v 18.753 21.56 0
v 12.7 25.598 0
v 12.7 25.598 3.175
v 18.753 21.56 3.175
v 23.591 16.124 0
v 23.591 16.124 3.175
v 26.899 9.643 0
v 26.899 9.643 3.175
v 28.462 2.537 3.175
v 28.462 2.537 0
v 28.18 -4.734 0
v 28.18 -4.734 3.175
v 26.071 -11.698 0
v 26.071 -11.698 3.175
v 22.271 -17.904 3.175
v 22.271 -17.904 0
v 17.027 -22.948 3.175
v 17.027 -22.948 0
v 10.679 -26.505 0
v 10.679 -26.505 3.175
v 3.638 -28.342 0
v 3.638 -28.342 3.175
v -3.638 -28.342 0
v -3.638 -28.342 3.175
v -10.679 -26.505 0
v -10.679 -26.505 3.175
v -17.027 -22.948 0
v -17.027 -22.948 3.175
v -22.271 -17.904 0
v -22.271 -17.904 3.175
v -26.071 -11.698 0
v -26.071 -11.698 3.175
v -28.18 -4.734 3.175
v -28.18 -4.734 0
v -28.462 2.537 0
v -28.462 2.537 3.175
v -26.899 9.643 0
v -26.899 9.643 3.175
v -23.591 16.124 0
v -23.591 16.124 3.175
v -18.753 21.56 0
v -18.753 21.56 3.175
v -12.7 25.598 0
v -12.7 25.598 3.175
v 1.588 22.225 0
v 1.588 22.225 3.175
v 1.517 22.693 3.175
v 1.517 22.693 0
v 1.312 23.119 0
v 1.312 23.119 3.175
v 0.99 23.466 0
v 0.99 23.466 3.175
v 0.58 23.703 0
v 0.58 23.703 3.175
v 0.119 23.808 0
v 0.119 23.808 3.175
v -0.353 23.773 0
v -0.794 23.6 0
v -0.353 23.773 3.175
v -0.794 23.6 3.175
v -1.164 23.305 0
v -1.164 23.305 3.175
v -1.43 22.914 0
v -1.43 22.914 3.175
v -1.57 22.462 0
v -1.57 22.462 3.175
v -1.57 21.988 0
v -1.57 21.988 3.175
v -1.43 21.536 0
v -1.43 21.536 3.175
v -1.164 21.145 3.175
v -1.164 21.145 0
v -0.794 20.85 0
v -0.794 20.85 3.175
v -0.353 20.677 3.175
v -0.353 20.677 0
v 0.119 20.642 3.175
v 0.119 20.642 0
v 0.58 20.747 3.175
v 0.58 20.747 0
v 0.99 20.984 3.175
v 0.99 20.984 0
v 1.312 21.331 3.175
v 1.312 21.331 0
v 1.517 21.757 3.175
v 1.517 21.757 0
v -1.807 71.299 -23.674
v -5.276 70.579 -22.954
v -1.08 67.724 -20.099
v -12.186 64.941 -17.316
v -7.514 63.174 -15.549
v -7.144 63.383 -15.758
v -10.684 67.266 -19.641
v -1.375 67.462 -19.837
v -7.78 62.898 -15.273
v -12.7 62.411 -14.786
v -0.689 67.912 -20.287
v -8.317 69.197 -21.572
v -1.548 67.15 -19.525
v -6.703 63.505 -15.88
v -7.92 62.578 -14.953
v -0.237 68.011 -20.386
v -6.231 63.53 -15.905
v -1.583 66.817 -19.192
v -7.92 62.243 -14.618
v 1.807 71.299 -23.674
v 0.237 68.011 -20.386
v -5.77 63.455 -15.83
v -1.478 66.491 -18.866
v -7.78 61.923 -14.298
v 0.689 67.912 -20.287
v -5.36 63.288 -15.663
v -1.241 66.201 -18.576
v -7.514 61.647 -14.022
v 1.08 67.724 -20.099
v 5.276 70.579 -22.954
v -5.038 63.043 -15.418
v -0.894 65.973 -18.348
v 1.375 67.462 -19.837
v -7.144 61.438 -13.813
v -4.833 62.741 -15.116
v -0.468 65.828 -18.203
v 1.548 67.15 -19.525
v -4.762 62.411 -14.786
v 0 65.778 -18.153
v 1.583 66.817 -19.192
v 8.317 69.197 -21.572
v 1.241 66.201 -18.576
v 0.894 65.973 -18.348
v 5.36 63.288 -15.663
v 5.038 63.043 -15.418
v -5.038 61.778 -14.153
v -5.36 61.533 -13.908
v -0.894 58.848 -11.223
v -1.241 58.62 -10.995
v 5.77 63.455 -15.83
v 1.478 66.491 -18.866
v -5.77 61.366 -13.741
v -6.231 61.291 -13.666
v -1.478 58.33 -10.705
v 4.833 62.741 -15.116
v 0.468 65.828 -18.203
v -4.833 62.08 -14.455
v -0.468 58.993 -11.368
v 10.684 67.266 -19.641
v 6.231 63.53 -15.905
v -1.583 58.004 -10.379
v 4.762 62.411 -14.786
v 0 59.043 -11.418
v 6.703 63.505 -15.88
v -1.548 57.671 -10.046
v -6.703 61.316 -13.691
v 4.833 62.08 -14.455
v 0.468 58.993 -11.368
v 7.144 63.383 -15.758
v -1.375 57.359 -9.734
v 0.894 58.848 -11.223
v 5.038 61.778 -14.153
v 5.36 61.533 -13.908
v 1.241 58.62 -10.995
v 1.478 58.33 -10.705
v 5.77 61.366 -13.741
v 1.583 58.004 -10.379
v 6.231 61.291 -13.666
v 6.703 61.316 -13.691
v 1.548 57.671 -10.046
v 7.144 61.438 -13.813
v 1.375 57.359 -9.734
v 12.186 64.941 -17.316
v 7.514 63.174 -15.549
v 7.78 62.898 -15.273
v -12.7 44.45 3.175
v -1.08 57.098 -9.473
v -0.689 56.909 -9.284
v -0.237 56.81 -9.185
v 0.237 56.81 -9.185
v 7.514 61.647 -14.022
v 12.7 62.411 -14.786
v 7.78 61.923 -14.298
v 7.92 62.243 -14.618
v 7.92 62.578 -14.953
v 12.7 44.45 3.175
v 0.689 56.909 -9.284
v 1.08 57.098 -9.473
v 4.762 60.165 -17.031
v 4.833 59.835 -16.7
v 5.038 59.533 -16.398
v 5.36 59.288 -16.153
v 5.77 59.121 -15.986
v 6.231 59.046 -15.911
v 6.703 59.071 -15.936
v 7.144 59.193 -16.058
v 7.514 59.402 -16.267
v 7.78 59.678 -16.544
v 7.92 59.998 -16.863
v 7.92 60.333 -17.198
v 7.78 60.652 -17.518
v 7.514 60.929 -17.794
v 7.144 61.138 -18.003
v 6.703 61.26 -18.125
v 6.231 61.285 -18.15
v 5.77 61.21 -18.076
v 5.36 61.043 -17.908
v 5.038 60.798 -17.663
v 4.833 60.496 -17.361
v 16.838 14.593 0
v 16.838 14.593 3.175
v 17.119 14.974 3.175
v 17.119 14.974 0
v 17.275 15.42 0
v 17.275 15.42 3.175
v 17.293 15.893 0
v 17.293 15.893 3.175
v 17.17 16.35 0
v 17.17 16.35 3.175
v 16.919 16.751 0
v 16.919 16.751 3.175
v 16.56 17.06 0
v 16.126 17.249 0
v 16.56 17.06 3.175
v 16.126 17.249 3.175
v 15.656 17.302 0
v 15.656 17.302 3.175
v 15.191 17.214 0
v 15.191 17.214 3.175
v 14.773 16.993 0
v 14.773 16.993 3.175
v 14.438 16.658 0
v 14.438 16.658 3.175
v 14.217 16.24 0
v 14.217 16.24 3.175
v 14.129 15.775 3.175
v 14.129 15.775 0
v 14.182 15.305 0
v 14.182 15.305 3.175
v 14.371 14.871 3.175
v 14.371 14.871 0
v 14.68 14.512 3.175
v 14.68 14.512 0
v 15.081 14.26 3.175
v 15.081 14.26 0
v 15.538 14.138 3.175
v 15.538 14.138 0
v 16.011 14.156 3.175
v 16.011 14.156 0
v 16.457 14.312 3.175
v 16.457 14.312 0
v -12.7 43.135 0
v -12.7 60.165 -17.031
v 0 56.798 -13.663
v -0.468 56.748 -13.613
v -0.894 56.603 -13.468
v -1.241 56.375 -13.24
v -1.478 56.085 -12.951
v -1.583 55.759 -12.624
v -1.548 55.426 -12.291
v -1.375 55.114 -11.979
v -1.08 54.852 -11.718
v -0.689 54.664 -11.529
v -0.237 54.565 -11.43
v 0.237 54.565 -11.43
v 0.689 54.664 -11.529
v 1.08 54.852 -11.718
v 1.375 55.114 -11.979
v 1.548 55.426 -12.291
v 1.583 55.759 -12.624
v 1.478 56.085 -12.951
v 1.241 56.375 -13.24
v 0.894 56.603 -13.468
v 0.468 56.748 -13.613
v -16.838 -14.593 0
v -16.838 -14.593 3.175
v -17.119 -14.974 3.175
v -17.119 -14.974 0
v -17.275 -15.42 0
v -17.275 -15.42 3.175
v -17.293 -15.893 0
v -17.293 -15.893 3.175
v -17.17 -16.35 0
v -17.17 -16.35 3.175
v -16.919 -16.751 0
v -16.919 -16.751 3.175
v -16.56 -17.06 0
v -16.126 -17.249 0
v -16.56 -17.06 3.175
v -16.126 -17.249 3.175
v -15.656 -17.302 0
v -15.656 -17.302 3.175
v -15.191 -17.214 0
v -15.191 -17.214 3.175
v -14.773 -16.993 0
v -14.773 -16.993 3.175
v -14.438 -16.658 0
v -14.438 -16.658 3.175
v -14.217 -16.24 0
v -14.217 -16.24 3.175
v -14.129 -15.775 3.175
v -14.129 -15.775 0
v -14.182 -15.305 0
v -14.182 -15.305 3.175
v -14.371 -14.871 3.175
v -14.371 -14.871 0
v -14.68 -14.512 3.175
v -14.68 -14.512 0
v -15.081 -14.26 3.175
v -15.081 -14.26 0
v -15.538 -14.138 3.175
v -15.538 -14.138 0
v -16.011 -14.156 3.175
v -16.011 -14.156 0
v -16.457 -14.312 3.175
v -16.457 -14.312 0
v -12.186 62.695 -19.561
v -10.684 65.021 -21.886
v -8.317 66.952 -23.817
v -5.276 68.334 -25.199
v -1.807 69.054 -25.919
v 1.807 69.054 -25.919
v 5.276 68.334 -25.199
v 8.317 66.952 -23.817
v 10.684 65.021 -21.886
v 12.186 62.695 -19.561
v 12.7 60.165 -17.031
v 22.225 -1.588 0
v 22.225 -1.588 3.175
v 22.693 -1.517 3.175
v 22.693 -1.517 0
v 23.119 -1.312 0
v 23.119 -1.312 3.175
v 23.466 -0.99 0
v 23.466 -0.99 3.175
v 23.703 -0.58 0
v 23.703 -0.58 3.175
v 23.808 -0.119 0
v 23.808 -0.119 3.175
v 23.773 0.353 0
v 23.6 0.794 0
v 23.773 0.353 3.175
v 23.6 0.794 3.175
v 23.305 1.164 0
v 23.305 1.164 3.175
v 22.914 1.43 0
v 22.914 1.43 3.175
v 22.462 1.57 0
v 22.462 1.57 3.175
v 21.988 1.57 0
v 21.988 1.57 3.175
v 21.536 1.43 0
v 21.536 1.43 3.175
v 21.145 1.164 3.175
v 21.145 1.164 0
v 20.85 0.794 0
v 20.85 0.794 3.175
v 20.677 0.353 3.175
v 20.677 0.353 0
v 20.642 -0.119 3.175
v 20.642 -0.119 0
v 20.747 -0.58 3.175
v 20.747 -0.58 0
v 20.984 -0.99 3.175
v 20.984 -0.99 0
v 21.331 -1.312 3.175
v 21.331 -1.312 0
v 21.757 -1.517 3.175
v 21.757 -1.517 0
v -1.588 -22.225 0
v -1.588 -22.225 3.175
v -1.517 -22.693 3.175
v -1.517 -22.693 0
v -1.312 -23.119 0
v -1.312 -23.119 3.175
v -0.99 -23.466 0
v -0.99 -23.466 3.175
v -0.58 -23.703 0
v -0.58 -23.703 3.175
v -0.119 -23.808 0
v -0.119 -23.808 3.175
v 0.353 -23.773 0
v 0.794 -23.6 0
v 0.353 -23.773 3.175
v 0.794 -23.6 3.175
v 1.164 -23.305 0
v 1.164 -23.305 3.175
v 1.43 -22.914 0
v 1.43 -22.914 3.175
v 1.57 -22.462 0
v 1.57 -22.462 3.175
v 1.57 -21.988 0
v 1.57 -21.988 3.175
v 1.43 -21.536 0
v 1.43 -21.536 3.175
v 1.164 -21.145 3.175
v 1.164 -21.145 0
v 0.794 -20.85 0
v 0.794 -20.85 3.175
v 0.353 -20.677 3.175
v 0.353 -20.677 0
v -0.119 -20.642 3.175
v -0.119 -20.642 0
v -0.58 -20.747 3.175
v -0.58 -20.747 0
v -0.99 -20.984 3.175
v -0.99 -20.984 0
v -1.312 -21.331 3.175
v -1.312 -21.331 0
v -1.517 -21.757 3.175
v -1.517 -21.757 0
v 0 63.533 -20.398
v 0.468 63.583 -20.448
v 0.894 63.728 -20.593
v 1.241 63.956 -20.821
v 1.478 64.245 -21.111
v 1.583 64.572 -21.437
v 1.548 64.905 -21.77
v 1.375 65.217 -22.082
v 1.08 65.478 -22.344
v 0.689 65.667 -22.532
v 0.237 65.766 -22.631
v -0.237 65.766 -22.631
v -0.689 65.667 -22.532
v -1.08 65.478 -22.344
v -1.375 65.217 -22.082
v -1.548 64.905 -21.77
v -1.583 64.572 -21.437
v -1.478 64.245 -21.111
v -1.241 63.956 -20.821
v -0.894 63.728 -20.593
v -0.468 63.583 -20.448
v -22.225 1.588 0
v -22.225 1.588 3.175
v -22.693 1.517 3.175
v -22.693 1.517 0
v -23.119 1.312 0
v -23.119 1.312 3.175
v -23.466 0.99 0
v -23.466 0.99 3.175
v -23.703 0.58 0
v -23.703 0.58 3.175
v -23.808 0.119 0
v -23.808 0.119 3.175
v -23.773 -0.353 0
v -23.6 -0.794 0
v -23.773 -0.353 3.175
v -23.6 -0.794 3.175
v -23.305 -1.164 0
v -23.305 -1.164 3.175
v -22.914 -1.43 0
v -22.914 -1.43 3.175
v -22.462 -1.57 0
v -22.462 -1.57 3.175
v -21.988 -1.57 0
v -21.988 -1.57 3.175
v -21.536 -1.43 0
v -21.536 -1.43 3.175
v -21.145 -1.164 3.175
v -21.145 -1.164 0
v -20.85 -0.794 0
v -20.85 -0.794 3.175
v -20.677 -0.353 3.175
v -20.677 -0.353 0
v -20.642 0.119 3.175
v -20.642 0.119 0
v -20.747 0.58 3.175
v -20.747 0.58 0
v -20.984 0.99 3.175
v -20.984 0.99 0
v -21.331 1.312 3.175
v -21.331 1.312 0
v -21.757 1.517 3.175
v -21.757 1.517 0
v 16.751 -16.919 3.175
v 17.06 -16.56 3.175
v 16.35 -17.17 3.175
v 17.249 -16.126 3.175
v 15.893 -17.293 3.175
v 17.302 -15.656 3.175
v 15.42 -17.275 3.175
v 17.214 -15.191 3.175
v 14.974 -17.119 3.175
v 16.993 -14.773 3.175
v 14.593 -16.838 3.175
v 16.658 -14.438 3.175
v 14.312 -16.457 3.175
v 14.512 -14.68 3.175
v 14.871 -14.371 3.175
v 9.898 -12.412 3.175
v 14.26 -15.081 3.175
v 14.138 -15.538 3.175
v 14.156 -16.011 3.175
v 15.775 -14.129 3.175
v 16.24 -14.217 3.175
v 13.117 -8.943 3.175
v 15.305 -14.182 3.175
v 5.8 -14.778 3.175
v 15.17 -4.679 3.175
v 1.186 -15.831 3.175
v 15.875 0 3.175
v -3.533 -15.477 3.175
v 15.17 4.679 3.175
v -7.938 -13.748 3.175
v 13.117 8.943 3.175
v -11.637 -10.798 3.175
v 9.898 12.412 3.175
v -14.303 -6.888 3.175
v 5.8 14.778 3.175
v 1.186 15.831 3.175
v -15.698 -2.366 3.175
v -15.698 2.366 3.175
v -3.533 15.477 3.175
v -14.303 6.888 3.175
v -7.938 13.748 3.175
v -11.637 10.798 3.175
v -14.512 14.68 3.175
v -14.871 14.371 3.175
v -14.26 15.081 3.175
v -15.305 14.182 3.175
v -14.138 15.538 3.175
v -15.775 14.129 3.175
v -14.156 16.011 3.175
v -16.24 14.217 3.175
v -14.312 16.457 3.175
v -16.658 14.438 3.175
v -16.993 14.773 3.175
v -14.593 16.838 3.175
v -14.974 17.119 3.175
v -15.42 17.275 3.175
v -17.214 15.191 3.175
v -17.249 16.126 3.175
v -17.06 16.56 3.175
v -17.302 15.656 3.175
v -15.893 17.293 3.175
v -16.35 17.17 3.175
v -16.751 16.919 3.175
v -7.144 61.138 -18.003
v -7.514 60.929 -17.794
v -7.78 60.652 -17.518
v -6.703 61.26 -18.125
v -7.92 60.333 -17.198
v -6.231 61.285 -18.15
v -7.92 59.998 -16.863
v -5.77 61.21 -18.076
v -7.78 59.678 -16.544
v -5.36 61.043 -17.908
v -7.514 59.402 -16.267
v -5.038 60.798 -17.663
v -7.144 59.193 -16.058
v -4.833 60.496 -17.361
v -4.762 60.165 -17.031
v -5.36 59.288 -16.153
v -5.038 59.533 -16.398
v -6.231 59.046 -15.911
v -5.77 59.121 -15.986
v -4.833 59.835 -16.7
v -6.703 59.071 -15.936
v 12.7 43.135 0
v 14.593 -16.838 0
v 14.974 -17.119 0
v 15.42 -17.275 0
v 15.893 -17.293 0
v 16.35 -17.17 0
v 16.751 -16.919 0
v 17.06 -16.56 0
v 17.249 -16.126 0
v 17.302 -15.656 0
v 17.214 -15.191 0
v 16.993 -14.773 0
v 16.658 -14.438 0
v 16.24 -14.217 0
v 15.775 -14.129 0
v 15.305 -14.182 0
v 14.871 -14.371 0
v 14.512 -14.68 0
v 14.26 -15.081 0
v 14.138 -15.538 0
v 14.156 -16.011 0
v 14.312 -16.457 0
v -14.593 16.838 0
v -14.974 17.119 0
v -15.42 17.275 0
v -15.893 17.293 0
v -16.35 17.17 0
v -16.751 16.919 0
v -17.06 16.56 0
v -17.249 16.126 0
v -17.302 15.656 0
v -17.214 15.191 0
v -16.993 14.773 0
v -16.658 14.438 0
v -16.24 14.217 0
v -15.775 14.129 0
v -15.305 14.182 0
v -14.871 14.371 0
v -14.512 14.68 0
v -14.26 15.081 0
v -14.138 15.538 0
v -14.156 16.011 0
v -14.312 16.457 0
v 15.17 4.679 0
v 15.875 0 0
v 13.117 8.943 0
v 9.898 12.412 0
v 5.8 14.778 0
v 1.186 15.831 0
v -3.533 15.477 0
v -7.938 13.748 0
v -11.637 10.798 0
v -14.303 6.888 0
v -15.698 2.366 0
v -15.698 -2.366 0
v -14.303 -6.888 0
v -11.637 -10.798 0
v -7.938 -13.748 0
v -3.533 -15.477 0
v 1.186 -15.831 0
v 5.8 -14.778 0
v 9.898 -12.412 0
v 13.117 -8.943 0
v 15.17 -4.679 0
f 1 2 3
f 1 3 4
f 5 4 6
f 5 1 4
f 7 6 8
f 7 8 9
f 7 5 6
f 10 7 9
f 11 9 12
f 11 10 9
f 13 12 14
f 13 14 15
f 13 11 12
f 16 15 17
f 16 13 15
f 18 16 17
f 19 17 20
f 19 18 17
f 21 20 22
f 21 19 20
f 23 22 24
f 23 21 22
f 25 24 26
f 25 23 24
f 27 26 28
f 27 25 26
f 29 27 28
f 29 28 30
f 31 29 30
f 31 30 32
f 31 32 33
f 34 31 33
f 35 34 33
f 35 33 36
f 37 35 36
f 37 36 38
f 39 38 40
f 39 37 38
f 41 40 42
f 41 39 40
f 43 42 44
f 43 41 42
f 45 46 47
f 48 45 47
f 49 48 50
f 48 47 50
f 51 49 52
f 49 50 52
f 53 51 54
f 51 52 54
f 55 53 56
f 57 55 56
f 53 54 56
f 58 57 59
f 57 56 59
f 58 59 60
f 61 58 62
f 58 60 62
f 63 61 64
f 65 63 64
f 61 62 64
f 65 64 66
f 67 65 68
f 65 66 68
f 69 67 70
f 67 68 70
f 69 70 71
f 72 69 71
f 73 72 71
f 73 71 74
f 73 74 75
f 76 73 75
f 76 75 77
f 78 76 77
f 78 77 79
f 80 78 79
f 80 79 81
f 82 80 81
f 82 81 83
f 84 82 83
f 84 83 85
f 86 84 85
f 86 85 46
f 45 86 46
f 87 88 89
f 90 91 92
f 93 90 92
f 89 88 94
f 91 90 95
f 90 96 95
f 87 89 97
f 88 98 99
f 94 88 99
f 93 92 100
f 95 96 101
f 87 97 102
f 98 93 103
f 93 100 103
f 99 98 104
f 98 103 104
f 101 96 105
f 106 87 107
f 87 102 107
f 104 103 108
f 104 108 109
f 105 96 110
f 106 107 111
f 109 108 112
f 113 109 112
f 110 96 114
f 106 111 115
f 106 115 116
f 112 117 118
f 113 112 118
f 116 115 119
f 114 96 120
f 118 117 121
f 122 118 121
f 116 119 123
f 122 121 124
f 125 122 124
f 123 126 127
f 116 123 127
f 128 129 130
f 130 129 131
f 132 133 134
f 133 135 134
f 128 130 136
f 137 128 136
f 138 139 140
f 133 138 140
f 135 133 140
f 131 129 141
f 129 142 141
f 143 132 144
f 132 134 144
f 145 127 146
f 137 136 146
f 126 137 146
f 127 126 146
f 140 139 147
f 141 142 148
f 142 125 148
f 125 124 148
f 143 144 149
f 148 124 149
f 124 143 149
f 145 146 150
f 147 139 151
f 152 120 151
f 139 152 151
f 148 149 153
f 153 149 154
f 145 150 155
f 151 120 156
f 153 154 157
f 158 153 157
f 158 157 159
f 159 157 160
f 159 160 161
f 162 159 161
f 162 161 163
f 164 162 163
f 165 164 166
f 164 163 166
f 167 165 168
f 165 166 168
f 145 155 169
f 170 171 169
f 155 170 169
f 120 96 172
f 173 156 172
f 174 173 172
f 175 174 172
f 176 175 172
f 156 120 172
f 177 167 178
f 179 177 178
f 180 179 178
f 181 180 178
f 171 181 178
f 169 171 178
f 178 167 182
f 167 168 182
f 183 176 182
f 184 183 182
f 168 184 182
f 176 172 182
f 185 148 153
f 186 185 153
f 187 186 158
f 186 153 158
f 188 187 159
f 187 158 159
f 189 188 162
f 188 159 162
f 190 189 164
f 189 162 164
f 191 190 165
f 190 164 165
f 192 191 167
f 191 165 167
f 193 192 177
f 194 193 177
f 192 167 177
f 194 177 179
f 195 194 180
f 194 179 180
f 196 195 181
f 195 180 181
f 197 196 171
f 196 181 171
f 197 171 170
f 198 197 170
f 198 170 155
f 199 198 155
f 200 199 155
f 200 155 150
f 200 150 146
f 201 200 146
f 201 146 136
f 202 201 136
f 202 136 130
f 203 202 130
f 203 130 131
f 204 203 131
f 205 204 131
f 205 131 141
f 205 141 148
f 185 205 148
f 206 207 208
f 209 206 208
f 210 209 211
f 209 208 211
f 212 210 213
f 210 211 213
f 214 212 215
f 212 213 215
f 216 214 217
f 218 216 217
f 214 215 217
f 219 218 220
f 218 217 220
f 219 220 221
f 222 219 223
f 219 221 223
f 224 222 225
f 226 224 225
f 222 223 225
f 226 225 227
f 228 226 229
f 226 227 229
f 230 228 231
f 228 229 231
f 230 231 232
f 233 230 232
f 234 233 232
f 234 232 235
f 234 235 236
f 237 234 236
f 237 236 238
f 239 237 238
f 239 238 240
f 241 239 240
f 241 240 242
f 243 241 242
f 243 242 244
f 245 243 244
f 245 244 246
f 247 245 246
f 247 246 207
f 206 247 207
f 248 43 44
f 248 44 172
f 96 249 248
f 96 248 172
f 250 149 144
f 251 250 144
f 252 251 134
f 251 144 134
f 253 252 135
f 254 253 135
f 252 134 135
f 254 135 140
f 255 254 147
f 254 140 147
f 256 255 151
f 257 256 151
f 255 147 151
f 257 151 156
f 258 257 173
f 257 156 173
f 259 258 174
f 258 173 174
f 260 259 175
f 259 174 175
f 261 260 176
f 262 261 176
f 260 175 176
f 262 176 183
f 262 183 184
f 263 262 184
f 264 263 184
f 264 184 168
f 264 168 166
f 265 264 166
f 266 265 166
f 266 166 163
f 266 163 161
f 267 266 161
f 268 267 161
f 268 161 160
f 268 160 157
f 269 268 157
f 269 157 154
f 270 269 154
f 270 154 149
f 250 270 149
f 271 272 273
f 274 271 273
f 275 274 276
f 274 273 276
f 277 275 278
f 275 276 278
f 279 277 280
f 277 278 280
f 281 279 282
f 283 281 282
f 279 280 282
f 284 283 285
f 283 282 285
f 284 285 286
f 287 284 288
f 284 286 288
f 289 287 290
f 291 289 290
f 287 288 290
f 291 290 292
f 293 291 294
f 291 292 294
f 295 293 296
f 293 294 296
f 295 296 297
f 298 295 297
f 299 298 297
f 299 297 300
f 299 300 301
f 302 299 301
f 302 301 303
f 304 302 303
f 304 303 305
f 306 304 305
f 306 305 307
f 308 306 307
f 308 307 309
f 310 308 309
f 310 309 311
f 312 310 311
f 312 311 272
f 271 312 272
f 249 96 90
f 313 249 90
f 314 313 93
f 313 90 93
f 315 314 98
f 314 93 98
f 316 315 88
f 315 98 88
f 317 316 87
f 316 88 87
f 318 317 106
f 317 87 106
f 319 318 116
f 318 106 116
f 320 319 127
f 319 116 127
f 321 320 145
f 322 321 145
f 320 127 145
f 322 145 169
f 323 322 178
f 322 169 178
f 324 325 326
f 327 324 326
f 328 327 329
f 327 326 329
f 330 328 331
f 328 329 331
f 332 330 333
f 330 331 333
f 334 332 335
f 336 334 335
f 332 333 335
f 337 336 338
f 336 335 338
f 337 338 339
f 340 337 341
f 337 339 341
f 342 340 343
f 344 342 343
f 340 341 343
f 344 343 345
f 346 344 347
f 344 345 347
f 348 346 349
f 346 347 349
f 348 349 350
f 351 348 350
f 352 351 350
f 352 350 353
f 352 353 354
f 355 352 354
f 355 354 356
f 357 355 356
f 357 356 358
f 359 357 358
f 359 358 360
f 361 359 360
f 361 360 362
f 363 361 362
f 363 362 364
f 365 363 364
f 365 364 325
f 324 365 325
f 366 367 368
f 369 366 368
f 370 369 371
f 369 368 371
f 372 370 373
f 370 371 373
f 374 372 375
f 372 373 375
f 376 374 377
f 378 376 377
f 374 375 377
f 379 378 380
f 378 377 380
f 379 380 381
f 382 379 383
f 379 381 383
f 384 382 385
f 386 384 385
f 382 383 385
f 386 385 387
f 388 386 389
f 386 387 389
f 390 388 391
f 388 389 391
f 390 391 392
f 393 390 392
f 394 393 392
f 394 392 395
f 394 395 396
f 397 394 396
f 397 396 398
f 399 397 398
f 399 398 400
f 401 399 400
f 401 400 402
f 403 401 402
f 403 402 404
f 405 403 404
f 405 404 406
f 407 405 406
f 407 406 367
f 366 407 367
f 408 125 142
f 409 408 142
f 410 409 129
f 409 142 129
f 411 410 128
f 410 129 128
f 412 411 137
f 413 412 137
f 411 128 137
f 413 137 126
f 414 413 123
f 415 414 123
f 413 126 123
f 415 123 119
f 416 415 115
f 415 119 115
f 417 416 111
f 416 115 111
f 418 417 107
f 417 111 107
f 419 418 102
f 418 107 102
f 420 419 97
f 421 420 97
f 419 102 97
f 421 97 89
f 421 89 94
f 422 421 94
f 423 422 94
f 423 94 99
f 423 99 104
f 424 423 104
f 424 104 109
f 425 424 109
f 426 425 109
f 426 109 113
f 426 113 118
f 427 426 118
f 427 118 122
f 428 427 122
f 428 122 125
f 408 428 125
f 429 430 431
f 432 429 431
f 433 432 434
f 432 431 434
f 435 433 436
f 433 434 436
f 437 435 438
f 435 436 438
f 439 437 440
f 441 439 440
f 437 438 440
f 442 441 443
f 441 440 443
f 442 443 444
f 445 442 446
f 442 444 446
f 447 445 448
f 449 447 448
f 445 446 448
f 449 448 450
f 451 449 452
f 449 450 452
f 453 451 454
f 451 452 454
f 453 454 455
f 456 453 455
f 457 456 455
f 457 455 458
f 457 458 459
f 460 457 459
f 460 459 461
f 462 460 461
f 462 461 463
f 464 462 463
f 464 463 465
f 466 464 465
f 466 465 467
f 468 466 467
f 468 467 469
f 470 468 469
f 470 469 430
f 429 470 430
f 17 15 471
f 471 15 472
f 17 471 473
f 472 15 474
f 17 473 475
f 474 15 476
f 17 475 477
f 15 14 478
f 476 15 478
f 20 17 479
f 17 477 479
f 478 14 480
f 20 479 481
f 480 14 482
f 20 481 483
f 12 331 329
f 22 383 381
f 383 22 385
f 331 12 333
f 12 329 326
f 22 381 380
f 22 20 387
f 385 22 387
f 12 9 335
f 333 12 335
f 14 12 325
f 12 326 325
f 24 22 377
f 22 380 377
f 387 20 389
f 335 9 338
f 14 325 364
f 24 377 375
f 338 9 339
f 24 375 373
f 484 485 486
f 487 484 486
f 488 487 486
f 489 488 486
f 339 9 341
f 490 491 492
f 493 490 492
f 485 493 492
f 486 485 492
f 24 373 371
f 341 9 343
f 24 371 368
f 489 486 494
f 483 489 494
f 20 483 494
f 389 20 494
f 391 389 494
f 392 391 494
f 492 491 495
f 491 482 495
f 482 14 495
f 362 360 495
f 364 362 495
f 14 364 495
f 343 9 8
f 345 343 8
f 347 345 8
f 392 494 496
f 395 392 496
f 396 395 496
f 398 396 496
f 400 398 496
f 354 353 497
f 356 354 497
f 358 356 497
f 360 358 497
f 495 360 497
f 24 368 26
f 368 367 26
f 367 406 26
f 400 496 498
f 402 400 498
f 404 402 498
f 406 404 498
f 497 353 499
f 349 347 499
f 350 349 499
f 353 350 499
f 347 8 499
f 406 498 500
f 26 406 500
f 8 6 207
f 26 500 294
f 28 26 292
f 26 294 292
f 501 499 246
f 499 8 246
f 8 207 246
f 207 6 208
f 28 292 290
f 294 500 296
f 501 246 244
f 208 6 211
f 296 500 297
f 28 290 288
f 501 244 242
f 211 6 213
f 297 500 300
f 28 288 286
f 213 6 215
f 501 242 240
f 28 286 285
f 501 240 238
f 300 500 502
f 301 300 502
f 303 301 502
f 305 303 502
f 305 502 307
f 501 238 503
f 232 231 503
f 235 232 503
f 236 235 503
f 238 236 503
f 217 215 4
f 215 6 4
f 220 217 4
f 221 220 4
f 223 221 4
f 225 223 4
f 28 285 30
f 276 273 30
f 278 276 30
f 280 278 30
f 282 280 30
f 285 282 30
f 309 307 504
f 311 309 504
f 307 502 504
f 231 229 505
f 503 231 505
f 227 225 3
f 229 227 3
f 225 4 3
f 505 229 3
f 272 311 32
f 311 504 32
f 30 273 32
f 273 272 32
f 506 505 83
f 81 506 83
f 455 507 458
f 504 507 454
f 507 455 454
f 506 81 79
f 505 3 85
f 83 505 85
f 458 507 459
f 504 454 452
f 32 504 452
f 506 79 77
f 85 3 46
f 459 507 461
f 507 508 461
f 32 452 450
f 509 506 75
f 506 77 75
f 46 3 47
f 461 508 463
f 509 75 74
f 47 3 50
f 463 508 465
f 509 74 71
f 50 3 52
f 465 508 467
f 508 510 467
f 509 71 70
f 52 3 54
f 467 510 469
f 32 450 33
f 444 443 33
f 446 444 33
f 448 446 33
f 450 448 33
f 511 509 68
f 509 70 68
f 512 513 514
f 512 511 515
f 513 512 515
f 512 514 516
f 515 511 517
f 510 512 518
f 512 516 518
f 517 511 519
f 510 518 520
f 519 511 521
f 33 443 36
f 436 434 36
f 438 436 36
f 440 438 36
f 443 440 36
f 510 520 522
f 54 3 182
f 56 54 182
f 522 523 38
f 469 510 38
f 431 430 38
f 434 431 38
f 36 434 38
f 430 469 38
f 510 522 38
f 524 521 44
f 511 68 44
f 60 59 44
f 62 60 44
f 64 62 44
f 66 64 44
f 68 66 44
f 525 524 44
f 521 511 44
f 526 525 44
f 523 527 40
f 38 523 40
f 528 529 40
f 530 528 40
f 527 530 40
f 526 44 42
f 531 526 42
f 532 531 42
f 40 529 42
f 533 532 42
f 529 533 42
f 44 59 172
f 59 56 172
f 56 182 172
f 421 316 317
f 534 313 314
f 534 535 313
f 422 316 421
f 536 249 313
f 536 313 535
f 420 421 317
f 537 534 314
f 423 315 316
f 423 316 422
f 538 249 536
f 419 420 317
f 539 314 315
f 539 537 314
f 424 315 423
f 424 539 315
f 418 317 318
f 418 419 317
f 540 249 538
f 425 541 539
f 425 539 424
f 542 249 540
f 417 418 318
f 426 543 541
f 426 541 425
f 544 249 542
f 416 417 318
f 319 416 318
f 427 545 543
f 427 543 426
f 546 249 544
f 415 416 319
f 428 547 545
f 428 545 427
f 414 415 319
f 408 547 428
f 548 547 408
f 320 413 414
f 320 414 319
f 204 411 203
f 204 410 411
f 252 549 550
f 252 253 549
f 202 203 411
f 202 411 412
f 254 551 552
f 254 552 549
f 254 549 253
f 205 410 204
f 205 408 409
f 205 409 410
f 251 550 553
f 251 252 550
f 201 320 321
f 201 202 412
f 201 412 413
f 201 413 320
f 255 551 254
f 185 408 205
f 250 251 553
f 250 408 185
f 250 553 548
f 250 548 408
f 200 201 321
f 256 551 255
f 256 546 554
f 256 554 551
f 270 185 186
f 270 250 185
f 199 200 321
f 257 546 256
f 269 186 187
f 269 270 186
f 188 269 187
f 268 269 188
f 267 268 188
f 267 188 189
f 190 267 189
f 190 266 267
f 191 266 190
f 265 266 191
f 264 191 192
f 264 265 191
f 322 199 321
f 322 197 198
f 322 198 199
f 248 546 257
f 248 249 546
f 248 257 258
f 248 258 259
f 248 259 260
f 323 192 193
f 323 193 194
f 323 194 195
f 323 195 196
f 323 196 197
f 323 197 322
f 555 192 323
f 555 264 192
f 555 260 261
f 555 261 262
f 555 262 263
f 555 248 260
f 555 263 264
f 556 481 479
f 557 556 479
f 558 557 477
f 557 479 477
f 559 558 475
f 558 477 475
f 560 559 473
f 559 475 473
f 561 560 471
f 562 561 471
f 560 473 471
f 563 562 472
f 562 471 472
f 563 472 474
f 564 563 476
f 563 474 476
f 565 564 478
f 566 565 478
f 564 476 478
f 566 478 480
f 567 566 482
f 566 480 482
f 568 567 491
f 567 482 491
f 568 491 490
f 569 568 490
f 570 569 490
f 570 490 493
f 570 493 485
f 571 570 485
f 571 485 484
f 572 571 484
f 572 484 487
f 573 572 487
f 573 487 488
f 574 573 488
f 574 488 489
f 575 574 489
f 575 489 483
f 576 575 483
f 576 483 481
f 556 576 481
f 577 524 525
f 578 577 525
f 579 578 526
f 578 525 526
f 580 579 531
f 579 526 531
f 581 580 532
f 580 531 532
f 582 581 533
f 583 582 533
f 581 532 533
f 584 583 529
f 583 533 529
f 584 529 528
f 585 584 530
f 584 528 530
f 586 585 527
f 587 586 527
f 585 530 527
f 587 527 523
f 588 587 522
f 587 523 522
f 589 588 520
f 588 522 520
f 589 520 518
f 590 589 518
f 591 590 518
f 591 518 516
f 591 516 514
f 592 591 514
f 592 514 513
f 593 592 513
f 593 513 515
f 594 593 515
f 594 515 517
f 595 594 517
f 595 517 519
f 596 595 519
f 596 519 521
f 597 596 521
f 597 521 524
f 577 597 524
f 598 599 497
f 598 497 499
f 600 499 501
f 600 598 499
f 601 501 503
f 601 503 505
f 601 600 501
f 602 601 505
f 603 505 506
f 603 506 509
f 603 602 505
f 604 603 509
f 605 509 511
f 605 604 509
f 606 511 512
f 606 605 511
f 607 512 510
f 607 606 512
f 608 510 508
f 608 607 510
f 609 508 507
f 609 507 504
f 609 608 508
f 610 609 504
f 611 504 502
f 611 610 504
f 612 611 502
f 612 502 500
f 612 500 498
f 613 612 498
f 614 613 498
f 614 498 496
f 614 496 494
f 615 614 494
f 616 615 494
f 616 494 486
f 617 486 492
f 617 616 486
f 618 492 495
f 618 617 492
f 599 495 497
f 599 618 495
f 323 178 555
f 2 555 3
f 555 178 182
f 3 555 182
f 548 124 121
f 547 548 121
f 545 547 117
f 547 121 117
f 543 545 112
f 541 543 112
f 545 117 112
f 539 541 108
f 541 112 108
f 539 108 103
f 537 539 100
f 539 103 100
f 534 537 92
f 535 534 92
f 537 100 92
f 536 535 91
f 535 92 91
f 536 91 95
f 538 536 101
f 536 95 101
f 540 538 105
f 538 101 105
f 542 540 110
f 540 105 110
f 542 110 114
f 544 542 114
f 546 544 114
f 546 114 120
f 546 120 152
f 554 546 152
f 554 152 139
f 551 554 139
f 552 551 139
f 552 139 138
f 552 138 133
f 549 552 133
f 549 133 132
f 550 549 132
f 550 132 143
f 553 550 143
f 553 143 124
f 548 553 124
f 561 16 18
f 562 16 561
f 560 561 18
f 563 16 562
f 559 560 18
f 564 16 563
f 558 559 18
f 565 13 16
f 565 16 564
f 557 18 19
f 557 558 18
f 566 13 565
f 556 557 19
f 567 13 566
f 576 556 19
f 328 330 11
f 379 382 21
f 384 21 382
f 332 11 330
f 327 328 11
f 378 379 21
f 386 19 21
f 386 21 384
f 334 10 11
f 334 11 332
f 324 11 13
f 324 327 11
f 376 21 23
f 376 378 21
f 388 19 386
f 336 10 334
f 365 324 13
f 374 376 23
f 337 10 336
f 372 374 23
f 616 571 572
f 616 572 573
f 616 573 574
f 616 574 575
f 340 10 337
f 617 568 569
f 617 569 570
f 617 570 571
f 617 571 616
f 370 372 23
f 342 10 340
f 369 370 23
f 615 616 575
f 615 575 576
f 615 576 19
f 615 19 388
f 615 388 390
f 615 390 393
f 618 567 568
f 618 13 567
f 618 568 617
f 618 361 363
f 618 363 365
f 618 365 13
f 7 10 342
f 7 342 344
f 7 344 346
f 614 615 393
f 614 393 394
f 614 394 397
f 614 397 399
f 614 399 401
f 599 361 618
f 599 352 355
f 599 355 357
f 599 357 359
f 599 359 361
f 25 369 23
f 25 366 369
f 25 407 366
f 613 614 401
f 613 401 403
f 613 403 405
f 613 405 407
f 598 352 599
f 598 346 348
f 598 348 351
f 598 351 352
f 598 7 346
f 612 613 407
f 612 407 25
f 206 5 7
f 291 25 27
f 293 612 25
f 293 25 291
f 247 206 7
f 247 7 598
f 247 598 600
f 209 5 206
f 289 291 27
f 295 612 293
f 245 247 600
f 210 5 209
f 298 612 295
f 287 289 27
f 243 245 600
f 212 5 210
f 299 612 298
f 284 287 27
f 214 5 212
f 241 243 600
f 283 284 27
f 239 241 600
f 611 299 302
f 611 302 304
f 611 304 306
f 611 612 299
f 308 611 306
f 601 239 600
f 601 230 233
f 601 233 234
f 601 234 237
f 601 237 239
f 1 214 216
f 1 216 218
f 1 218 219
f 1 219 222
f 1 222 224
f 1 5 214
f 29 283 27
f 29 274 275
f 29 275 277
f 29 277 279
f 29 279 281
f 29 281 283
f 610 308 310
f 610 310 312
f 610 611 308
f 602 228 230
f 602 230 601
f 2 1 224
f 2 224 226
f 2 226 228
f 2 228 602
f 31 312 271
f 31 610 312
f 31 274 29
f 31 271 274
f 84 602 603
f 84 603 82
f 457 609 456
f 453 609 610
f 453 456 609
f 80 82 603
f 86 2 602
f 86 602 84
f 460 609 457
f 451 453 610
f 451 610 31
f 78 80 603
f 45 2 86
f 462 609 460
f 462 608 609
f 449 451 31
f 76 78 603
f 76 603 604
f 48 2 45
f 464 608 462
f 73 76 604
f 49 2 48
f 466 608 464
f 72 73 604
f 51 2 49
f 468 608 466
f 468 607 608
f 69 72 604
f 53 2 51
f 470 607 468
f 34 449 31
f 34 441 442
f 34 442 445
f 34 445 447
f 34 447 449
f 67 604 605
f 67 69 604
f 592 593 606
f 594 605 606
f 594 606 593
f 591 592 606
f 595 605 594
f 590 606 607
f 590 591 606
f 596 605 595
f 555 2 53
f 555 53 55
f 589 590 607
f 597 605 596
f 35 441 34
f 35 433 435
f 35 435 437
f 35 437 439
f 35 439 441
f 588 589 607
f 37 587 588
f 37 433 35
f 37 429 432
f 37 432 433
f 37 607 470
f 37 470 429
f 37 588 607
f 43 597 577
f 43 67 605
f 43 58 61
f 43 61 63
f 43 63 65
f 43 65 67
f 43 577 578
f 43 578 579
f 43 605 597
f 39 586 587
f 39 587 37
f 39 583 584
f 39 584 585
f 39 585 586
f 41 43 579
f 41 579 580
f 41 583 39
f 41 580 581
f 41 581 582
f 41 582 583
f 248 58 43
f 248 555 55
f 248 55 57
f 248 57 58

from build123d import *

# Parameters (mm, degrees)
SKETCH1_R         = 15.875
EXTRUDE1_DEPTH    = 3.175
EXTRUDE2_DEPTH    = 3.175
SKETCH3_R         = 1.5875
EXTRUDE3_DEPTH    = 83.249530363
CIRPATTERN1_COUNT = 8
SKETCH4_R         = 1.5875
EXTRUDE4_DEPTH    = 78.738955692
CIRPATTERN2_COUNT = 4


with BuildPart() as part:
    # Sketch1 → Extrude1 (new body)
    with BuildSketch(Plane.XY):
        with BuildLine():
            Line((-12.7, 25.597668351), (-12.7, 44.45))
            Line((-12.7, 44.45), (12.7, 44.45))
            Line((12.7, 44.45), (12.7, 25.597668351))
            ThreePointArc((12.7, 25.597668351), (0, -28.575), (-12.7, 25.597668351))
        make_face()
        Circle(SKETCH1_R, mode=Mode.SUBTRACT)
    extrude(amount=EXTRUDE1_DEPTH)

    # Sketch2 → Extrude2 (add)
    with BuildSketch(Plane(origin=(0, 23.8125, 23.8125), x_dir=(-1, 0, 0), z_dir=(0, 0.7071067811865488, 0.7071067811865462))):
        with BuildLine():
            Line((12.7, -29.185832393), (12.7, -54.585832393))
            ThreePointArc((12.7, -54.585832393), (0, -67.285832393), (-12.7, -54.585832393))
            Line((-12.7, -54.585832393), (-12.7, -29.185832393))
            Line((-12.7, -29.185832393), (12.7, -29.185832393))
        make_face()
    extrude(amount=-EXTRUDE2_DEPTH)

    # Sketch3 → Extrude3 (cut, through all)
    with BuildSketch(Plane.XY.offset(3.175)):
        with Locations((0, 22.225)):
            Circle(SKETCH3_R)
    extrude3 = extrude(amount=-EXTRUDE3_DEPTH, mode=Mode.SUBTRACT)

    # CirPattern1: Extrude3 ×8 about axis
    cirpattern1_axis = Axis((0, 0, 0), (0, 0, 1))
    for i in range(1, CIRPATTERN1_COUNT):
        add(extrude3.rotate(cirpattern1_axis, i * 360 / CIRPATTERN1_COUNT), mode=Mode.SUBTRACT)

    # Sketch4 → Extrude4 (cut, through all)
    with BuildSketch(Plane(origin=(0, 23.8125, 23.8125), x_dir=(1, 0, 0), z_dir=(0, 0.7071067811865488, 0.7071067811865462))):
        with Locations(Location((0, 60.935832393, 0), (0, 0, 270))):
            Circle(SKETCH4_R)
    extrude4 = extrude(amount=-EXTRUDE4_DEPTH, mode=Mode.SUBTRACT)

    # CirPattern2: Extrude4 ×4 about axis
    cirpattern2_axis = Axis((0, 38.598012242, -38.598012242), (0, 0.7071067811865488, 0.7071067811865462))
    for i in range(1, CIRPATTERN2_COUNT):
        add(extrude4.rotate(cirpattern2_axis, i * 360 / CIRPATTERN2_COUNT), mode=Mode.SUBTRACT)


solid = part.part
